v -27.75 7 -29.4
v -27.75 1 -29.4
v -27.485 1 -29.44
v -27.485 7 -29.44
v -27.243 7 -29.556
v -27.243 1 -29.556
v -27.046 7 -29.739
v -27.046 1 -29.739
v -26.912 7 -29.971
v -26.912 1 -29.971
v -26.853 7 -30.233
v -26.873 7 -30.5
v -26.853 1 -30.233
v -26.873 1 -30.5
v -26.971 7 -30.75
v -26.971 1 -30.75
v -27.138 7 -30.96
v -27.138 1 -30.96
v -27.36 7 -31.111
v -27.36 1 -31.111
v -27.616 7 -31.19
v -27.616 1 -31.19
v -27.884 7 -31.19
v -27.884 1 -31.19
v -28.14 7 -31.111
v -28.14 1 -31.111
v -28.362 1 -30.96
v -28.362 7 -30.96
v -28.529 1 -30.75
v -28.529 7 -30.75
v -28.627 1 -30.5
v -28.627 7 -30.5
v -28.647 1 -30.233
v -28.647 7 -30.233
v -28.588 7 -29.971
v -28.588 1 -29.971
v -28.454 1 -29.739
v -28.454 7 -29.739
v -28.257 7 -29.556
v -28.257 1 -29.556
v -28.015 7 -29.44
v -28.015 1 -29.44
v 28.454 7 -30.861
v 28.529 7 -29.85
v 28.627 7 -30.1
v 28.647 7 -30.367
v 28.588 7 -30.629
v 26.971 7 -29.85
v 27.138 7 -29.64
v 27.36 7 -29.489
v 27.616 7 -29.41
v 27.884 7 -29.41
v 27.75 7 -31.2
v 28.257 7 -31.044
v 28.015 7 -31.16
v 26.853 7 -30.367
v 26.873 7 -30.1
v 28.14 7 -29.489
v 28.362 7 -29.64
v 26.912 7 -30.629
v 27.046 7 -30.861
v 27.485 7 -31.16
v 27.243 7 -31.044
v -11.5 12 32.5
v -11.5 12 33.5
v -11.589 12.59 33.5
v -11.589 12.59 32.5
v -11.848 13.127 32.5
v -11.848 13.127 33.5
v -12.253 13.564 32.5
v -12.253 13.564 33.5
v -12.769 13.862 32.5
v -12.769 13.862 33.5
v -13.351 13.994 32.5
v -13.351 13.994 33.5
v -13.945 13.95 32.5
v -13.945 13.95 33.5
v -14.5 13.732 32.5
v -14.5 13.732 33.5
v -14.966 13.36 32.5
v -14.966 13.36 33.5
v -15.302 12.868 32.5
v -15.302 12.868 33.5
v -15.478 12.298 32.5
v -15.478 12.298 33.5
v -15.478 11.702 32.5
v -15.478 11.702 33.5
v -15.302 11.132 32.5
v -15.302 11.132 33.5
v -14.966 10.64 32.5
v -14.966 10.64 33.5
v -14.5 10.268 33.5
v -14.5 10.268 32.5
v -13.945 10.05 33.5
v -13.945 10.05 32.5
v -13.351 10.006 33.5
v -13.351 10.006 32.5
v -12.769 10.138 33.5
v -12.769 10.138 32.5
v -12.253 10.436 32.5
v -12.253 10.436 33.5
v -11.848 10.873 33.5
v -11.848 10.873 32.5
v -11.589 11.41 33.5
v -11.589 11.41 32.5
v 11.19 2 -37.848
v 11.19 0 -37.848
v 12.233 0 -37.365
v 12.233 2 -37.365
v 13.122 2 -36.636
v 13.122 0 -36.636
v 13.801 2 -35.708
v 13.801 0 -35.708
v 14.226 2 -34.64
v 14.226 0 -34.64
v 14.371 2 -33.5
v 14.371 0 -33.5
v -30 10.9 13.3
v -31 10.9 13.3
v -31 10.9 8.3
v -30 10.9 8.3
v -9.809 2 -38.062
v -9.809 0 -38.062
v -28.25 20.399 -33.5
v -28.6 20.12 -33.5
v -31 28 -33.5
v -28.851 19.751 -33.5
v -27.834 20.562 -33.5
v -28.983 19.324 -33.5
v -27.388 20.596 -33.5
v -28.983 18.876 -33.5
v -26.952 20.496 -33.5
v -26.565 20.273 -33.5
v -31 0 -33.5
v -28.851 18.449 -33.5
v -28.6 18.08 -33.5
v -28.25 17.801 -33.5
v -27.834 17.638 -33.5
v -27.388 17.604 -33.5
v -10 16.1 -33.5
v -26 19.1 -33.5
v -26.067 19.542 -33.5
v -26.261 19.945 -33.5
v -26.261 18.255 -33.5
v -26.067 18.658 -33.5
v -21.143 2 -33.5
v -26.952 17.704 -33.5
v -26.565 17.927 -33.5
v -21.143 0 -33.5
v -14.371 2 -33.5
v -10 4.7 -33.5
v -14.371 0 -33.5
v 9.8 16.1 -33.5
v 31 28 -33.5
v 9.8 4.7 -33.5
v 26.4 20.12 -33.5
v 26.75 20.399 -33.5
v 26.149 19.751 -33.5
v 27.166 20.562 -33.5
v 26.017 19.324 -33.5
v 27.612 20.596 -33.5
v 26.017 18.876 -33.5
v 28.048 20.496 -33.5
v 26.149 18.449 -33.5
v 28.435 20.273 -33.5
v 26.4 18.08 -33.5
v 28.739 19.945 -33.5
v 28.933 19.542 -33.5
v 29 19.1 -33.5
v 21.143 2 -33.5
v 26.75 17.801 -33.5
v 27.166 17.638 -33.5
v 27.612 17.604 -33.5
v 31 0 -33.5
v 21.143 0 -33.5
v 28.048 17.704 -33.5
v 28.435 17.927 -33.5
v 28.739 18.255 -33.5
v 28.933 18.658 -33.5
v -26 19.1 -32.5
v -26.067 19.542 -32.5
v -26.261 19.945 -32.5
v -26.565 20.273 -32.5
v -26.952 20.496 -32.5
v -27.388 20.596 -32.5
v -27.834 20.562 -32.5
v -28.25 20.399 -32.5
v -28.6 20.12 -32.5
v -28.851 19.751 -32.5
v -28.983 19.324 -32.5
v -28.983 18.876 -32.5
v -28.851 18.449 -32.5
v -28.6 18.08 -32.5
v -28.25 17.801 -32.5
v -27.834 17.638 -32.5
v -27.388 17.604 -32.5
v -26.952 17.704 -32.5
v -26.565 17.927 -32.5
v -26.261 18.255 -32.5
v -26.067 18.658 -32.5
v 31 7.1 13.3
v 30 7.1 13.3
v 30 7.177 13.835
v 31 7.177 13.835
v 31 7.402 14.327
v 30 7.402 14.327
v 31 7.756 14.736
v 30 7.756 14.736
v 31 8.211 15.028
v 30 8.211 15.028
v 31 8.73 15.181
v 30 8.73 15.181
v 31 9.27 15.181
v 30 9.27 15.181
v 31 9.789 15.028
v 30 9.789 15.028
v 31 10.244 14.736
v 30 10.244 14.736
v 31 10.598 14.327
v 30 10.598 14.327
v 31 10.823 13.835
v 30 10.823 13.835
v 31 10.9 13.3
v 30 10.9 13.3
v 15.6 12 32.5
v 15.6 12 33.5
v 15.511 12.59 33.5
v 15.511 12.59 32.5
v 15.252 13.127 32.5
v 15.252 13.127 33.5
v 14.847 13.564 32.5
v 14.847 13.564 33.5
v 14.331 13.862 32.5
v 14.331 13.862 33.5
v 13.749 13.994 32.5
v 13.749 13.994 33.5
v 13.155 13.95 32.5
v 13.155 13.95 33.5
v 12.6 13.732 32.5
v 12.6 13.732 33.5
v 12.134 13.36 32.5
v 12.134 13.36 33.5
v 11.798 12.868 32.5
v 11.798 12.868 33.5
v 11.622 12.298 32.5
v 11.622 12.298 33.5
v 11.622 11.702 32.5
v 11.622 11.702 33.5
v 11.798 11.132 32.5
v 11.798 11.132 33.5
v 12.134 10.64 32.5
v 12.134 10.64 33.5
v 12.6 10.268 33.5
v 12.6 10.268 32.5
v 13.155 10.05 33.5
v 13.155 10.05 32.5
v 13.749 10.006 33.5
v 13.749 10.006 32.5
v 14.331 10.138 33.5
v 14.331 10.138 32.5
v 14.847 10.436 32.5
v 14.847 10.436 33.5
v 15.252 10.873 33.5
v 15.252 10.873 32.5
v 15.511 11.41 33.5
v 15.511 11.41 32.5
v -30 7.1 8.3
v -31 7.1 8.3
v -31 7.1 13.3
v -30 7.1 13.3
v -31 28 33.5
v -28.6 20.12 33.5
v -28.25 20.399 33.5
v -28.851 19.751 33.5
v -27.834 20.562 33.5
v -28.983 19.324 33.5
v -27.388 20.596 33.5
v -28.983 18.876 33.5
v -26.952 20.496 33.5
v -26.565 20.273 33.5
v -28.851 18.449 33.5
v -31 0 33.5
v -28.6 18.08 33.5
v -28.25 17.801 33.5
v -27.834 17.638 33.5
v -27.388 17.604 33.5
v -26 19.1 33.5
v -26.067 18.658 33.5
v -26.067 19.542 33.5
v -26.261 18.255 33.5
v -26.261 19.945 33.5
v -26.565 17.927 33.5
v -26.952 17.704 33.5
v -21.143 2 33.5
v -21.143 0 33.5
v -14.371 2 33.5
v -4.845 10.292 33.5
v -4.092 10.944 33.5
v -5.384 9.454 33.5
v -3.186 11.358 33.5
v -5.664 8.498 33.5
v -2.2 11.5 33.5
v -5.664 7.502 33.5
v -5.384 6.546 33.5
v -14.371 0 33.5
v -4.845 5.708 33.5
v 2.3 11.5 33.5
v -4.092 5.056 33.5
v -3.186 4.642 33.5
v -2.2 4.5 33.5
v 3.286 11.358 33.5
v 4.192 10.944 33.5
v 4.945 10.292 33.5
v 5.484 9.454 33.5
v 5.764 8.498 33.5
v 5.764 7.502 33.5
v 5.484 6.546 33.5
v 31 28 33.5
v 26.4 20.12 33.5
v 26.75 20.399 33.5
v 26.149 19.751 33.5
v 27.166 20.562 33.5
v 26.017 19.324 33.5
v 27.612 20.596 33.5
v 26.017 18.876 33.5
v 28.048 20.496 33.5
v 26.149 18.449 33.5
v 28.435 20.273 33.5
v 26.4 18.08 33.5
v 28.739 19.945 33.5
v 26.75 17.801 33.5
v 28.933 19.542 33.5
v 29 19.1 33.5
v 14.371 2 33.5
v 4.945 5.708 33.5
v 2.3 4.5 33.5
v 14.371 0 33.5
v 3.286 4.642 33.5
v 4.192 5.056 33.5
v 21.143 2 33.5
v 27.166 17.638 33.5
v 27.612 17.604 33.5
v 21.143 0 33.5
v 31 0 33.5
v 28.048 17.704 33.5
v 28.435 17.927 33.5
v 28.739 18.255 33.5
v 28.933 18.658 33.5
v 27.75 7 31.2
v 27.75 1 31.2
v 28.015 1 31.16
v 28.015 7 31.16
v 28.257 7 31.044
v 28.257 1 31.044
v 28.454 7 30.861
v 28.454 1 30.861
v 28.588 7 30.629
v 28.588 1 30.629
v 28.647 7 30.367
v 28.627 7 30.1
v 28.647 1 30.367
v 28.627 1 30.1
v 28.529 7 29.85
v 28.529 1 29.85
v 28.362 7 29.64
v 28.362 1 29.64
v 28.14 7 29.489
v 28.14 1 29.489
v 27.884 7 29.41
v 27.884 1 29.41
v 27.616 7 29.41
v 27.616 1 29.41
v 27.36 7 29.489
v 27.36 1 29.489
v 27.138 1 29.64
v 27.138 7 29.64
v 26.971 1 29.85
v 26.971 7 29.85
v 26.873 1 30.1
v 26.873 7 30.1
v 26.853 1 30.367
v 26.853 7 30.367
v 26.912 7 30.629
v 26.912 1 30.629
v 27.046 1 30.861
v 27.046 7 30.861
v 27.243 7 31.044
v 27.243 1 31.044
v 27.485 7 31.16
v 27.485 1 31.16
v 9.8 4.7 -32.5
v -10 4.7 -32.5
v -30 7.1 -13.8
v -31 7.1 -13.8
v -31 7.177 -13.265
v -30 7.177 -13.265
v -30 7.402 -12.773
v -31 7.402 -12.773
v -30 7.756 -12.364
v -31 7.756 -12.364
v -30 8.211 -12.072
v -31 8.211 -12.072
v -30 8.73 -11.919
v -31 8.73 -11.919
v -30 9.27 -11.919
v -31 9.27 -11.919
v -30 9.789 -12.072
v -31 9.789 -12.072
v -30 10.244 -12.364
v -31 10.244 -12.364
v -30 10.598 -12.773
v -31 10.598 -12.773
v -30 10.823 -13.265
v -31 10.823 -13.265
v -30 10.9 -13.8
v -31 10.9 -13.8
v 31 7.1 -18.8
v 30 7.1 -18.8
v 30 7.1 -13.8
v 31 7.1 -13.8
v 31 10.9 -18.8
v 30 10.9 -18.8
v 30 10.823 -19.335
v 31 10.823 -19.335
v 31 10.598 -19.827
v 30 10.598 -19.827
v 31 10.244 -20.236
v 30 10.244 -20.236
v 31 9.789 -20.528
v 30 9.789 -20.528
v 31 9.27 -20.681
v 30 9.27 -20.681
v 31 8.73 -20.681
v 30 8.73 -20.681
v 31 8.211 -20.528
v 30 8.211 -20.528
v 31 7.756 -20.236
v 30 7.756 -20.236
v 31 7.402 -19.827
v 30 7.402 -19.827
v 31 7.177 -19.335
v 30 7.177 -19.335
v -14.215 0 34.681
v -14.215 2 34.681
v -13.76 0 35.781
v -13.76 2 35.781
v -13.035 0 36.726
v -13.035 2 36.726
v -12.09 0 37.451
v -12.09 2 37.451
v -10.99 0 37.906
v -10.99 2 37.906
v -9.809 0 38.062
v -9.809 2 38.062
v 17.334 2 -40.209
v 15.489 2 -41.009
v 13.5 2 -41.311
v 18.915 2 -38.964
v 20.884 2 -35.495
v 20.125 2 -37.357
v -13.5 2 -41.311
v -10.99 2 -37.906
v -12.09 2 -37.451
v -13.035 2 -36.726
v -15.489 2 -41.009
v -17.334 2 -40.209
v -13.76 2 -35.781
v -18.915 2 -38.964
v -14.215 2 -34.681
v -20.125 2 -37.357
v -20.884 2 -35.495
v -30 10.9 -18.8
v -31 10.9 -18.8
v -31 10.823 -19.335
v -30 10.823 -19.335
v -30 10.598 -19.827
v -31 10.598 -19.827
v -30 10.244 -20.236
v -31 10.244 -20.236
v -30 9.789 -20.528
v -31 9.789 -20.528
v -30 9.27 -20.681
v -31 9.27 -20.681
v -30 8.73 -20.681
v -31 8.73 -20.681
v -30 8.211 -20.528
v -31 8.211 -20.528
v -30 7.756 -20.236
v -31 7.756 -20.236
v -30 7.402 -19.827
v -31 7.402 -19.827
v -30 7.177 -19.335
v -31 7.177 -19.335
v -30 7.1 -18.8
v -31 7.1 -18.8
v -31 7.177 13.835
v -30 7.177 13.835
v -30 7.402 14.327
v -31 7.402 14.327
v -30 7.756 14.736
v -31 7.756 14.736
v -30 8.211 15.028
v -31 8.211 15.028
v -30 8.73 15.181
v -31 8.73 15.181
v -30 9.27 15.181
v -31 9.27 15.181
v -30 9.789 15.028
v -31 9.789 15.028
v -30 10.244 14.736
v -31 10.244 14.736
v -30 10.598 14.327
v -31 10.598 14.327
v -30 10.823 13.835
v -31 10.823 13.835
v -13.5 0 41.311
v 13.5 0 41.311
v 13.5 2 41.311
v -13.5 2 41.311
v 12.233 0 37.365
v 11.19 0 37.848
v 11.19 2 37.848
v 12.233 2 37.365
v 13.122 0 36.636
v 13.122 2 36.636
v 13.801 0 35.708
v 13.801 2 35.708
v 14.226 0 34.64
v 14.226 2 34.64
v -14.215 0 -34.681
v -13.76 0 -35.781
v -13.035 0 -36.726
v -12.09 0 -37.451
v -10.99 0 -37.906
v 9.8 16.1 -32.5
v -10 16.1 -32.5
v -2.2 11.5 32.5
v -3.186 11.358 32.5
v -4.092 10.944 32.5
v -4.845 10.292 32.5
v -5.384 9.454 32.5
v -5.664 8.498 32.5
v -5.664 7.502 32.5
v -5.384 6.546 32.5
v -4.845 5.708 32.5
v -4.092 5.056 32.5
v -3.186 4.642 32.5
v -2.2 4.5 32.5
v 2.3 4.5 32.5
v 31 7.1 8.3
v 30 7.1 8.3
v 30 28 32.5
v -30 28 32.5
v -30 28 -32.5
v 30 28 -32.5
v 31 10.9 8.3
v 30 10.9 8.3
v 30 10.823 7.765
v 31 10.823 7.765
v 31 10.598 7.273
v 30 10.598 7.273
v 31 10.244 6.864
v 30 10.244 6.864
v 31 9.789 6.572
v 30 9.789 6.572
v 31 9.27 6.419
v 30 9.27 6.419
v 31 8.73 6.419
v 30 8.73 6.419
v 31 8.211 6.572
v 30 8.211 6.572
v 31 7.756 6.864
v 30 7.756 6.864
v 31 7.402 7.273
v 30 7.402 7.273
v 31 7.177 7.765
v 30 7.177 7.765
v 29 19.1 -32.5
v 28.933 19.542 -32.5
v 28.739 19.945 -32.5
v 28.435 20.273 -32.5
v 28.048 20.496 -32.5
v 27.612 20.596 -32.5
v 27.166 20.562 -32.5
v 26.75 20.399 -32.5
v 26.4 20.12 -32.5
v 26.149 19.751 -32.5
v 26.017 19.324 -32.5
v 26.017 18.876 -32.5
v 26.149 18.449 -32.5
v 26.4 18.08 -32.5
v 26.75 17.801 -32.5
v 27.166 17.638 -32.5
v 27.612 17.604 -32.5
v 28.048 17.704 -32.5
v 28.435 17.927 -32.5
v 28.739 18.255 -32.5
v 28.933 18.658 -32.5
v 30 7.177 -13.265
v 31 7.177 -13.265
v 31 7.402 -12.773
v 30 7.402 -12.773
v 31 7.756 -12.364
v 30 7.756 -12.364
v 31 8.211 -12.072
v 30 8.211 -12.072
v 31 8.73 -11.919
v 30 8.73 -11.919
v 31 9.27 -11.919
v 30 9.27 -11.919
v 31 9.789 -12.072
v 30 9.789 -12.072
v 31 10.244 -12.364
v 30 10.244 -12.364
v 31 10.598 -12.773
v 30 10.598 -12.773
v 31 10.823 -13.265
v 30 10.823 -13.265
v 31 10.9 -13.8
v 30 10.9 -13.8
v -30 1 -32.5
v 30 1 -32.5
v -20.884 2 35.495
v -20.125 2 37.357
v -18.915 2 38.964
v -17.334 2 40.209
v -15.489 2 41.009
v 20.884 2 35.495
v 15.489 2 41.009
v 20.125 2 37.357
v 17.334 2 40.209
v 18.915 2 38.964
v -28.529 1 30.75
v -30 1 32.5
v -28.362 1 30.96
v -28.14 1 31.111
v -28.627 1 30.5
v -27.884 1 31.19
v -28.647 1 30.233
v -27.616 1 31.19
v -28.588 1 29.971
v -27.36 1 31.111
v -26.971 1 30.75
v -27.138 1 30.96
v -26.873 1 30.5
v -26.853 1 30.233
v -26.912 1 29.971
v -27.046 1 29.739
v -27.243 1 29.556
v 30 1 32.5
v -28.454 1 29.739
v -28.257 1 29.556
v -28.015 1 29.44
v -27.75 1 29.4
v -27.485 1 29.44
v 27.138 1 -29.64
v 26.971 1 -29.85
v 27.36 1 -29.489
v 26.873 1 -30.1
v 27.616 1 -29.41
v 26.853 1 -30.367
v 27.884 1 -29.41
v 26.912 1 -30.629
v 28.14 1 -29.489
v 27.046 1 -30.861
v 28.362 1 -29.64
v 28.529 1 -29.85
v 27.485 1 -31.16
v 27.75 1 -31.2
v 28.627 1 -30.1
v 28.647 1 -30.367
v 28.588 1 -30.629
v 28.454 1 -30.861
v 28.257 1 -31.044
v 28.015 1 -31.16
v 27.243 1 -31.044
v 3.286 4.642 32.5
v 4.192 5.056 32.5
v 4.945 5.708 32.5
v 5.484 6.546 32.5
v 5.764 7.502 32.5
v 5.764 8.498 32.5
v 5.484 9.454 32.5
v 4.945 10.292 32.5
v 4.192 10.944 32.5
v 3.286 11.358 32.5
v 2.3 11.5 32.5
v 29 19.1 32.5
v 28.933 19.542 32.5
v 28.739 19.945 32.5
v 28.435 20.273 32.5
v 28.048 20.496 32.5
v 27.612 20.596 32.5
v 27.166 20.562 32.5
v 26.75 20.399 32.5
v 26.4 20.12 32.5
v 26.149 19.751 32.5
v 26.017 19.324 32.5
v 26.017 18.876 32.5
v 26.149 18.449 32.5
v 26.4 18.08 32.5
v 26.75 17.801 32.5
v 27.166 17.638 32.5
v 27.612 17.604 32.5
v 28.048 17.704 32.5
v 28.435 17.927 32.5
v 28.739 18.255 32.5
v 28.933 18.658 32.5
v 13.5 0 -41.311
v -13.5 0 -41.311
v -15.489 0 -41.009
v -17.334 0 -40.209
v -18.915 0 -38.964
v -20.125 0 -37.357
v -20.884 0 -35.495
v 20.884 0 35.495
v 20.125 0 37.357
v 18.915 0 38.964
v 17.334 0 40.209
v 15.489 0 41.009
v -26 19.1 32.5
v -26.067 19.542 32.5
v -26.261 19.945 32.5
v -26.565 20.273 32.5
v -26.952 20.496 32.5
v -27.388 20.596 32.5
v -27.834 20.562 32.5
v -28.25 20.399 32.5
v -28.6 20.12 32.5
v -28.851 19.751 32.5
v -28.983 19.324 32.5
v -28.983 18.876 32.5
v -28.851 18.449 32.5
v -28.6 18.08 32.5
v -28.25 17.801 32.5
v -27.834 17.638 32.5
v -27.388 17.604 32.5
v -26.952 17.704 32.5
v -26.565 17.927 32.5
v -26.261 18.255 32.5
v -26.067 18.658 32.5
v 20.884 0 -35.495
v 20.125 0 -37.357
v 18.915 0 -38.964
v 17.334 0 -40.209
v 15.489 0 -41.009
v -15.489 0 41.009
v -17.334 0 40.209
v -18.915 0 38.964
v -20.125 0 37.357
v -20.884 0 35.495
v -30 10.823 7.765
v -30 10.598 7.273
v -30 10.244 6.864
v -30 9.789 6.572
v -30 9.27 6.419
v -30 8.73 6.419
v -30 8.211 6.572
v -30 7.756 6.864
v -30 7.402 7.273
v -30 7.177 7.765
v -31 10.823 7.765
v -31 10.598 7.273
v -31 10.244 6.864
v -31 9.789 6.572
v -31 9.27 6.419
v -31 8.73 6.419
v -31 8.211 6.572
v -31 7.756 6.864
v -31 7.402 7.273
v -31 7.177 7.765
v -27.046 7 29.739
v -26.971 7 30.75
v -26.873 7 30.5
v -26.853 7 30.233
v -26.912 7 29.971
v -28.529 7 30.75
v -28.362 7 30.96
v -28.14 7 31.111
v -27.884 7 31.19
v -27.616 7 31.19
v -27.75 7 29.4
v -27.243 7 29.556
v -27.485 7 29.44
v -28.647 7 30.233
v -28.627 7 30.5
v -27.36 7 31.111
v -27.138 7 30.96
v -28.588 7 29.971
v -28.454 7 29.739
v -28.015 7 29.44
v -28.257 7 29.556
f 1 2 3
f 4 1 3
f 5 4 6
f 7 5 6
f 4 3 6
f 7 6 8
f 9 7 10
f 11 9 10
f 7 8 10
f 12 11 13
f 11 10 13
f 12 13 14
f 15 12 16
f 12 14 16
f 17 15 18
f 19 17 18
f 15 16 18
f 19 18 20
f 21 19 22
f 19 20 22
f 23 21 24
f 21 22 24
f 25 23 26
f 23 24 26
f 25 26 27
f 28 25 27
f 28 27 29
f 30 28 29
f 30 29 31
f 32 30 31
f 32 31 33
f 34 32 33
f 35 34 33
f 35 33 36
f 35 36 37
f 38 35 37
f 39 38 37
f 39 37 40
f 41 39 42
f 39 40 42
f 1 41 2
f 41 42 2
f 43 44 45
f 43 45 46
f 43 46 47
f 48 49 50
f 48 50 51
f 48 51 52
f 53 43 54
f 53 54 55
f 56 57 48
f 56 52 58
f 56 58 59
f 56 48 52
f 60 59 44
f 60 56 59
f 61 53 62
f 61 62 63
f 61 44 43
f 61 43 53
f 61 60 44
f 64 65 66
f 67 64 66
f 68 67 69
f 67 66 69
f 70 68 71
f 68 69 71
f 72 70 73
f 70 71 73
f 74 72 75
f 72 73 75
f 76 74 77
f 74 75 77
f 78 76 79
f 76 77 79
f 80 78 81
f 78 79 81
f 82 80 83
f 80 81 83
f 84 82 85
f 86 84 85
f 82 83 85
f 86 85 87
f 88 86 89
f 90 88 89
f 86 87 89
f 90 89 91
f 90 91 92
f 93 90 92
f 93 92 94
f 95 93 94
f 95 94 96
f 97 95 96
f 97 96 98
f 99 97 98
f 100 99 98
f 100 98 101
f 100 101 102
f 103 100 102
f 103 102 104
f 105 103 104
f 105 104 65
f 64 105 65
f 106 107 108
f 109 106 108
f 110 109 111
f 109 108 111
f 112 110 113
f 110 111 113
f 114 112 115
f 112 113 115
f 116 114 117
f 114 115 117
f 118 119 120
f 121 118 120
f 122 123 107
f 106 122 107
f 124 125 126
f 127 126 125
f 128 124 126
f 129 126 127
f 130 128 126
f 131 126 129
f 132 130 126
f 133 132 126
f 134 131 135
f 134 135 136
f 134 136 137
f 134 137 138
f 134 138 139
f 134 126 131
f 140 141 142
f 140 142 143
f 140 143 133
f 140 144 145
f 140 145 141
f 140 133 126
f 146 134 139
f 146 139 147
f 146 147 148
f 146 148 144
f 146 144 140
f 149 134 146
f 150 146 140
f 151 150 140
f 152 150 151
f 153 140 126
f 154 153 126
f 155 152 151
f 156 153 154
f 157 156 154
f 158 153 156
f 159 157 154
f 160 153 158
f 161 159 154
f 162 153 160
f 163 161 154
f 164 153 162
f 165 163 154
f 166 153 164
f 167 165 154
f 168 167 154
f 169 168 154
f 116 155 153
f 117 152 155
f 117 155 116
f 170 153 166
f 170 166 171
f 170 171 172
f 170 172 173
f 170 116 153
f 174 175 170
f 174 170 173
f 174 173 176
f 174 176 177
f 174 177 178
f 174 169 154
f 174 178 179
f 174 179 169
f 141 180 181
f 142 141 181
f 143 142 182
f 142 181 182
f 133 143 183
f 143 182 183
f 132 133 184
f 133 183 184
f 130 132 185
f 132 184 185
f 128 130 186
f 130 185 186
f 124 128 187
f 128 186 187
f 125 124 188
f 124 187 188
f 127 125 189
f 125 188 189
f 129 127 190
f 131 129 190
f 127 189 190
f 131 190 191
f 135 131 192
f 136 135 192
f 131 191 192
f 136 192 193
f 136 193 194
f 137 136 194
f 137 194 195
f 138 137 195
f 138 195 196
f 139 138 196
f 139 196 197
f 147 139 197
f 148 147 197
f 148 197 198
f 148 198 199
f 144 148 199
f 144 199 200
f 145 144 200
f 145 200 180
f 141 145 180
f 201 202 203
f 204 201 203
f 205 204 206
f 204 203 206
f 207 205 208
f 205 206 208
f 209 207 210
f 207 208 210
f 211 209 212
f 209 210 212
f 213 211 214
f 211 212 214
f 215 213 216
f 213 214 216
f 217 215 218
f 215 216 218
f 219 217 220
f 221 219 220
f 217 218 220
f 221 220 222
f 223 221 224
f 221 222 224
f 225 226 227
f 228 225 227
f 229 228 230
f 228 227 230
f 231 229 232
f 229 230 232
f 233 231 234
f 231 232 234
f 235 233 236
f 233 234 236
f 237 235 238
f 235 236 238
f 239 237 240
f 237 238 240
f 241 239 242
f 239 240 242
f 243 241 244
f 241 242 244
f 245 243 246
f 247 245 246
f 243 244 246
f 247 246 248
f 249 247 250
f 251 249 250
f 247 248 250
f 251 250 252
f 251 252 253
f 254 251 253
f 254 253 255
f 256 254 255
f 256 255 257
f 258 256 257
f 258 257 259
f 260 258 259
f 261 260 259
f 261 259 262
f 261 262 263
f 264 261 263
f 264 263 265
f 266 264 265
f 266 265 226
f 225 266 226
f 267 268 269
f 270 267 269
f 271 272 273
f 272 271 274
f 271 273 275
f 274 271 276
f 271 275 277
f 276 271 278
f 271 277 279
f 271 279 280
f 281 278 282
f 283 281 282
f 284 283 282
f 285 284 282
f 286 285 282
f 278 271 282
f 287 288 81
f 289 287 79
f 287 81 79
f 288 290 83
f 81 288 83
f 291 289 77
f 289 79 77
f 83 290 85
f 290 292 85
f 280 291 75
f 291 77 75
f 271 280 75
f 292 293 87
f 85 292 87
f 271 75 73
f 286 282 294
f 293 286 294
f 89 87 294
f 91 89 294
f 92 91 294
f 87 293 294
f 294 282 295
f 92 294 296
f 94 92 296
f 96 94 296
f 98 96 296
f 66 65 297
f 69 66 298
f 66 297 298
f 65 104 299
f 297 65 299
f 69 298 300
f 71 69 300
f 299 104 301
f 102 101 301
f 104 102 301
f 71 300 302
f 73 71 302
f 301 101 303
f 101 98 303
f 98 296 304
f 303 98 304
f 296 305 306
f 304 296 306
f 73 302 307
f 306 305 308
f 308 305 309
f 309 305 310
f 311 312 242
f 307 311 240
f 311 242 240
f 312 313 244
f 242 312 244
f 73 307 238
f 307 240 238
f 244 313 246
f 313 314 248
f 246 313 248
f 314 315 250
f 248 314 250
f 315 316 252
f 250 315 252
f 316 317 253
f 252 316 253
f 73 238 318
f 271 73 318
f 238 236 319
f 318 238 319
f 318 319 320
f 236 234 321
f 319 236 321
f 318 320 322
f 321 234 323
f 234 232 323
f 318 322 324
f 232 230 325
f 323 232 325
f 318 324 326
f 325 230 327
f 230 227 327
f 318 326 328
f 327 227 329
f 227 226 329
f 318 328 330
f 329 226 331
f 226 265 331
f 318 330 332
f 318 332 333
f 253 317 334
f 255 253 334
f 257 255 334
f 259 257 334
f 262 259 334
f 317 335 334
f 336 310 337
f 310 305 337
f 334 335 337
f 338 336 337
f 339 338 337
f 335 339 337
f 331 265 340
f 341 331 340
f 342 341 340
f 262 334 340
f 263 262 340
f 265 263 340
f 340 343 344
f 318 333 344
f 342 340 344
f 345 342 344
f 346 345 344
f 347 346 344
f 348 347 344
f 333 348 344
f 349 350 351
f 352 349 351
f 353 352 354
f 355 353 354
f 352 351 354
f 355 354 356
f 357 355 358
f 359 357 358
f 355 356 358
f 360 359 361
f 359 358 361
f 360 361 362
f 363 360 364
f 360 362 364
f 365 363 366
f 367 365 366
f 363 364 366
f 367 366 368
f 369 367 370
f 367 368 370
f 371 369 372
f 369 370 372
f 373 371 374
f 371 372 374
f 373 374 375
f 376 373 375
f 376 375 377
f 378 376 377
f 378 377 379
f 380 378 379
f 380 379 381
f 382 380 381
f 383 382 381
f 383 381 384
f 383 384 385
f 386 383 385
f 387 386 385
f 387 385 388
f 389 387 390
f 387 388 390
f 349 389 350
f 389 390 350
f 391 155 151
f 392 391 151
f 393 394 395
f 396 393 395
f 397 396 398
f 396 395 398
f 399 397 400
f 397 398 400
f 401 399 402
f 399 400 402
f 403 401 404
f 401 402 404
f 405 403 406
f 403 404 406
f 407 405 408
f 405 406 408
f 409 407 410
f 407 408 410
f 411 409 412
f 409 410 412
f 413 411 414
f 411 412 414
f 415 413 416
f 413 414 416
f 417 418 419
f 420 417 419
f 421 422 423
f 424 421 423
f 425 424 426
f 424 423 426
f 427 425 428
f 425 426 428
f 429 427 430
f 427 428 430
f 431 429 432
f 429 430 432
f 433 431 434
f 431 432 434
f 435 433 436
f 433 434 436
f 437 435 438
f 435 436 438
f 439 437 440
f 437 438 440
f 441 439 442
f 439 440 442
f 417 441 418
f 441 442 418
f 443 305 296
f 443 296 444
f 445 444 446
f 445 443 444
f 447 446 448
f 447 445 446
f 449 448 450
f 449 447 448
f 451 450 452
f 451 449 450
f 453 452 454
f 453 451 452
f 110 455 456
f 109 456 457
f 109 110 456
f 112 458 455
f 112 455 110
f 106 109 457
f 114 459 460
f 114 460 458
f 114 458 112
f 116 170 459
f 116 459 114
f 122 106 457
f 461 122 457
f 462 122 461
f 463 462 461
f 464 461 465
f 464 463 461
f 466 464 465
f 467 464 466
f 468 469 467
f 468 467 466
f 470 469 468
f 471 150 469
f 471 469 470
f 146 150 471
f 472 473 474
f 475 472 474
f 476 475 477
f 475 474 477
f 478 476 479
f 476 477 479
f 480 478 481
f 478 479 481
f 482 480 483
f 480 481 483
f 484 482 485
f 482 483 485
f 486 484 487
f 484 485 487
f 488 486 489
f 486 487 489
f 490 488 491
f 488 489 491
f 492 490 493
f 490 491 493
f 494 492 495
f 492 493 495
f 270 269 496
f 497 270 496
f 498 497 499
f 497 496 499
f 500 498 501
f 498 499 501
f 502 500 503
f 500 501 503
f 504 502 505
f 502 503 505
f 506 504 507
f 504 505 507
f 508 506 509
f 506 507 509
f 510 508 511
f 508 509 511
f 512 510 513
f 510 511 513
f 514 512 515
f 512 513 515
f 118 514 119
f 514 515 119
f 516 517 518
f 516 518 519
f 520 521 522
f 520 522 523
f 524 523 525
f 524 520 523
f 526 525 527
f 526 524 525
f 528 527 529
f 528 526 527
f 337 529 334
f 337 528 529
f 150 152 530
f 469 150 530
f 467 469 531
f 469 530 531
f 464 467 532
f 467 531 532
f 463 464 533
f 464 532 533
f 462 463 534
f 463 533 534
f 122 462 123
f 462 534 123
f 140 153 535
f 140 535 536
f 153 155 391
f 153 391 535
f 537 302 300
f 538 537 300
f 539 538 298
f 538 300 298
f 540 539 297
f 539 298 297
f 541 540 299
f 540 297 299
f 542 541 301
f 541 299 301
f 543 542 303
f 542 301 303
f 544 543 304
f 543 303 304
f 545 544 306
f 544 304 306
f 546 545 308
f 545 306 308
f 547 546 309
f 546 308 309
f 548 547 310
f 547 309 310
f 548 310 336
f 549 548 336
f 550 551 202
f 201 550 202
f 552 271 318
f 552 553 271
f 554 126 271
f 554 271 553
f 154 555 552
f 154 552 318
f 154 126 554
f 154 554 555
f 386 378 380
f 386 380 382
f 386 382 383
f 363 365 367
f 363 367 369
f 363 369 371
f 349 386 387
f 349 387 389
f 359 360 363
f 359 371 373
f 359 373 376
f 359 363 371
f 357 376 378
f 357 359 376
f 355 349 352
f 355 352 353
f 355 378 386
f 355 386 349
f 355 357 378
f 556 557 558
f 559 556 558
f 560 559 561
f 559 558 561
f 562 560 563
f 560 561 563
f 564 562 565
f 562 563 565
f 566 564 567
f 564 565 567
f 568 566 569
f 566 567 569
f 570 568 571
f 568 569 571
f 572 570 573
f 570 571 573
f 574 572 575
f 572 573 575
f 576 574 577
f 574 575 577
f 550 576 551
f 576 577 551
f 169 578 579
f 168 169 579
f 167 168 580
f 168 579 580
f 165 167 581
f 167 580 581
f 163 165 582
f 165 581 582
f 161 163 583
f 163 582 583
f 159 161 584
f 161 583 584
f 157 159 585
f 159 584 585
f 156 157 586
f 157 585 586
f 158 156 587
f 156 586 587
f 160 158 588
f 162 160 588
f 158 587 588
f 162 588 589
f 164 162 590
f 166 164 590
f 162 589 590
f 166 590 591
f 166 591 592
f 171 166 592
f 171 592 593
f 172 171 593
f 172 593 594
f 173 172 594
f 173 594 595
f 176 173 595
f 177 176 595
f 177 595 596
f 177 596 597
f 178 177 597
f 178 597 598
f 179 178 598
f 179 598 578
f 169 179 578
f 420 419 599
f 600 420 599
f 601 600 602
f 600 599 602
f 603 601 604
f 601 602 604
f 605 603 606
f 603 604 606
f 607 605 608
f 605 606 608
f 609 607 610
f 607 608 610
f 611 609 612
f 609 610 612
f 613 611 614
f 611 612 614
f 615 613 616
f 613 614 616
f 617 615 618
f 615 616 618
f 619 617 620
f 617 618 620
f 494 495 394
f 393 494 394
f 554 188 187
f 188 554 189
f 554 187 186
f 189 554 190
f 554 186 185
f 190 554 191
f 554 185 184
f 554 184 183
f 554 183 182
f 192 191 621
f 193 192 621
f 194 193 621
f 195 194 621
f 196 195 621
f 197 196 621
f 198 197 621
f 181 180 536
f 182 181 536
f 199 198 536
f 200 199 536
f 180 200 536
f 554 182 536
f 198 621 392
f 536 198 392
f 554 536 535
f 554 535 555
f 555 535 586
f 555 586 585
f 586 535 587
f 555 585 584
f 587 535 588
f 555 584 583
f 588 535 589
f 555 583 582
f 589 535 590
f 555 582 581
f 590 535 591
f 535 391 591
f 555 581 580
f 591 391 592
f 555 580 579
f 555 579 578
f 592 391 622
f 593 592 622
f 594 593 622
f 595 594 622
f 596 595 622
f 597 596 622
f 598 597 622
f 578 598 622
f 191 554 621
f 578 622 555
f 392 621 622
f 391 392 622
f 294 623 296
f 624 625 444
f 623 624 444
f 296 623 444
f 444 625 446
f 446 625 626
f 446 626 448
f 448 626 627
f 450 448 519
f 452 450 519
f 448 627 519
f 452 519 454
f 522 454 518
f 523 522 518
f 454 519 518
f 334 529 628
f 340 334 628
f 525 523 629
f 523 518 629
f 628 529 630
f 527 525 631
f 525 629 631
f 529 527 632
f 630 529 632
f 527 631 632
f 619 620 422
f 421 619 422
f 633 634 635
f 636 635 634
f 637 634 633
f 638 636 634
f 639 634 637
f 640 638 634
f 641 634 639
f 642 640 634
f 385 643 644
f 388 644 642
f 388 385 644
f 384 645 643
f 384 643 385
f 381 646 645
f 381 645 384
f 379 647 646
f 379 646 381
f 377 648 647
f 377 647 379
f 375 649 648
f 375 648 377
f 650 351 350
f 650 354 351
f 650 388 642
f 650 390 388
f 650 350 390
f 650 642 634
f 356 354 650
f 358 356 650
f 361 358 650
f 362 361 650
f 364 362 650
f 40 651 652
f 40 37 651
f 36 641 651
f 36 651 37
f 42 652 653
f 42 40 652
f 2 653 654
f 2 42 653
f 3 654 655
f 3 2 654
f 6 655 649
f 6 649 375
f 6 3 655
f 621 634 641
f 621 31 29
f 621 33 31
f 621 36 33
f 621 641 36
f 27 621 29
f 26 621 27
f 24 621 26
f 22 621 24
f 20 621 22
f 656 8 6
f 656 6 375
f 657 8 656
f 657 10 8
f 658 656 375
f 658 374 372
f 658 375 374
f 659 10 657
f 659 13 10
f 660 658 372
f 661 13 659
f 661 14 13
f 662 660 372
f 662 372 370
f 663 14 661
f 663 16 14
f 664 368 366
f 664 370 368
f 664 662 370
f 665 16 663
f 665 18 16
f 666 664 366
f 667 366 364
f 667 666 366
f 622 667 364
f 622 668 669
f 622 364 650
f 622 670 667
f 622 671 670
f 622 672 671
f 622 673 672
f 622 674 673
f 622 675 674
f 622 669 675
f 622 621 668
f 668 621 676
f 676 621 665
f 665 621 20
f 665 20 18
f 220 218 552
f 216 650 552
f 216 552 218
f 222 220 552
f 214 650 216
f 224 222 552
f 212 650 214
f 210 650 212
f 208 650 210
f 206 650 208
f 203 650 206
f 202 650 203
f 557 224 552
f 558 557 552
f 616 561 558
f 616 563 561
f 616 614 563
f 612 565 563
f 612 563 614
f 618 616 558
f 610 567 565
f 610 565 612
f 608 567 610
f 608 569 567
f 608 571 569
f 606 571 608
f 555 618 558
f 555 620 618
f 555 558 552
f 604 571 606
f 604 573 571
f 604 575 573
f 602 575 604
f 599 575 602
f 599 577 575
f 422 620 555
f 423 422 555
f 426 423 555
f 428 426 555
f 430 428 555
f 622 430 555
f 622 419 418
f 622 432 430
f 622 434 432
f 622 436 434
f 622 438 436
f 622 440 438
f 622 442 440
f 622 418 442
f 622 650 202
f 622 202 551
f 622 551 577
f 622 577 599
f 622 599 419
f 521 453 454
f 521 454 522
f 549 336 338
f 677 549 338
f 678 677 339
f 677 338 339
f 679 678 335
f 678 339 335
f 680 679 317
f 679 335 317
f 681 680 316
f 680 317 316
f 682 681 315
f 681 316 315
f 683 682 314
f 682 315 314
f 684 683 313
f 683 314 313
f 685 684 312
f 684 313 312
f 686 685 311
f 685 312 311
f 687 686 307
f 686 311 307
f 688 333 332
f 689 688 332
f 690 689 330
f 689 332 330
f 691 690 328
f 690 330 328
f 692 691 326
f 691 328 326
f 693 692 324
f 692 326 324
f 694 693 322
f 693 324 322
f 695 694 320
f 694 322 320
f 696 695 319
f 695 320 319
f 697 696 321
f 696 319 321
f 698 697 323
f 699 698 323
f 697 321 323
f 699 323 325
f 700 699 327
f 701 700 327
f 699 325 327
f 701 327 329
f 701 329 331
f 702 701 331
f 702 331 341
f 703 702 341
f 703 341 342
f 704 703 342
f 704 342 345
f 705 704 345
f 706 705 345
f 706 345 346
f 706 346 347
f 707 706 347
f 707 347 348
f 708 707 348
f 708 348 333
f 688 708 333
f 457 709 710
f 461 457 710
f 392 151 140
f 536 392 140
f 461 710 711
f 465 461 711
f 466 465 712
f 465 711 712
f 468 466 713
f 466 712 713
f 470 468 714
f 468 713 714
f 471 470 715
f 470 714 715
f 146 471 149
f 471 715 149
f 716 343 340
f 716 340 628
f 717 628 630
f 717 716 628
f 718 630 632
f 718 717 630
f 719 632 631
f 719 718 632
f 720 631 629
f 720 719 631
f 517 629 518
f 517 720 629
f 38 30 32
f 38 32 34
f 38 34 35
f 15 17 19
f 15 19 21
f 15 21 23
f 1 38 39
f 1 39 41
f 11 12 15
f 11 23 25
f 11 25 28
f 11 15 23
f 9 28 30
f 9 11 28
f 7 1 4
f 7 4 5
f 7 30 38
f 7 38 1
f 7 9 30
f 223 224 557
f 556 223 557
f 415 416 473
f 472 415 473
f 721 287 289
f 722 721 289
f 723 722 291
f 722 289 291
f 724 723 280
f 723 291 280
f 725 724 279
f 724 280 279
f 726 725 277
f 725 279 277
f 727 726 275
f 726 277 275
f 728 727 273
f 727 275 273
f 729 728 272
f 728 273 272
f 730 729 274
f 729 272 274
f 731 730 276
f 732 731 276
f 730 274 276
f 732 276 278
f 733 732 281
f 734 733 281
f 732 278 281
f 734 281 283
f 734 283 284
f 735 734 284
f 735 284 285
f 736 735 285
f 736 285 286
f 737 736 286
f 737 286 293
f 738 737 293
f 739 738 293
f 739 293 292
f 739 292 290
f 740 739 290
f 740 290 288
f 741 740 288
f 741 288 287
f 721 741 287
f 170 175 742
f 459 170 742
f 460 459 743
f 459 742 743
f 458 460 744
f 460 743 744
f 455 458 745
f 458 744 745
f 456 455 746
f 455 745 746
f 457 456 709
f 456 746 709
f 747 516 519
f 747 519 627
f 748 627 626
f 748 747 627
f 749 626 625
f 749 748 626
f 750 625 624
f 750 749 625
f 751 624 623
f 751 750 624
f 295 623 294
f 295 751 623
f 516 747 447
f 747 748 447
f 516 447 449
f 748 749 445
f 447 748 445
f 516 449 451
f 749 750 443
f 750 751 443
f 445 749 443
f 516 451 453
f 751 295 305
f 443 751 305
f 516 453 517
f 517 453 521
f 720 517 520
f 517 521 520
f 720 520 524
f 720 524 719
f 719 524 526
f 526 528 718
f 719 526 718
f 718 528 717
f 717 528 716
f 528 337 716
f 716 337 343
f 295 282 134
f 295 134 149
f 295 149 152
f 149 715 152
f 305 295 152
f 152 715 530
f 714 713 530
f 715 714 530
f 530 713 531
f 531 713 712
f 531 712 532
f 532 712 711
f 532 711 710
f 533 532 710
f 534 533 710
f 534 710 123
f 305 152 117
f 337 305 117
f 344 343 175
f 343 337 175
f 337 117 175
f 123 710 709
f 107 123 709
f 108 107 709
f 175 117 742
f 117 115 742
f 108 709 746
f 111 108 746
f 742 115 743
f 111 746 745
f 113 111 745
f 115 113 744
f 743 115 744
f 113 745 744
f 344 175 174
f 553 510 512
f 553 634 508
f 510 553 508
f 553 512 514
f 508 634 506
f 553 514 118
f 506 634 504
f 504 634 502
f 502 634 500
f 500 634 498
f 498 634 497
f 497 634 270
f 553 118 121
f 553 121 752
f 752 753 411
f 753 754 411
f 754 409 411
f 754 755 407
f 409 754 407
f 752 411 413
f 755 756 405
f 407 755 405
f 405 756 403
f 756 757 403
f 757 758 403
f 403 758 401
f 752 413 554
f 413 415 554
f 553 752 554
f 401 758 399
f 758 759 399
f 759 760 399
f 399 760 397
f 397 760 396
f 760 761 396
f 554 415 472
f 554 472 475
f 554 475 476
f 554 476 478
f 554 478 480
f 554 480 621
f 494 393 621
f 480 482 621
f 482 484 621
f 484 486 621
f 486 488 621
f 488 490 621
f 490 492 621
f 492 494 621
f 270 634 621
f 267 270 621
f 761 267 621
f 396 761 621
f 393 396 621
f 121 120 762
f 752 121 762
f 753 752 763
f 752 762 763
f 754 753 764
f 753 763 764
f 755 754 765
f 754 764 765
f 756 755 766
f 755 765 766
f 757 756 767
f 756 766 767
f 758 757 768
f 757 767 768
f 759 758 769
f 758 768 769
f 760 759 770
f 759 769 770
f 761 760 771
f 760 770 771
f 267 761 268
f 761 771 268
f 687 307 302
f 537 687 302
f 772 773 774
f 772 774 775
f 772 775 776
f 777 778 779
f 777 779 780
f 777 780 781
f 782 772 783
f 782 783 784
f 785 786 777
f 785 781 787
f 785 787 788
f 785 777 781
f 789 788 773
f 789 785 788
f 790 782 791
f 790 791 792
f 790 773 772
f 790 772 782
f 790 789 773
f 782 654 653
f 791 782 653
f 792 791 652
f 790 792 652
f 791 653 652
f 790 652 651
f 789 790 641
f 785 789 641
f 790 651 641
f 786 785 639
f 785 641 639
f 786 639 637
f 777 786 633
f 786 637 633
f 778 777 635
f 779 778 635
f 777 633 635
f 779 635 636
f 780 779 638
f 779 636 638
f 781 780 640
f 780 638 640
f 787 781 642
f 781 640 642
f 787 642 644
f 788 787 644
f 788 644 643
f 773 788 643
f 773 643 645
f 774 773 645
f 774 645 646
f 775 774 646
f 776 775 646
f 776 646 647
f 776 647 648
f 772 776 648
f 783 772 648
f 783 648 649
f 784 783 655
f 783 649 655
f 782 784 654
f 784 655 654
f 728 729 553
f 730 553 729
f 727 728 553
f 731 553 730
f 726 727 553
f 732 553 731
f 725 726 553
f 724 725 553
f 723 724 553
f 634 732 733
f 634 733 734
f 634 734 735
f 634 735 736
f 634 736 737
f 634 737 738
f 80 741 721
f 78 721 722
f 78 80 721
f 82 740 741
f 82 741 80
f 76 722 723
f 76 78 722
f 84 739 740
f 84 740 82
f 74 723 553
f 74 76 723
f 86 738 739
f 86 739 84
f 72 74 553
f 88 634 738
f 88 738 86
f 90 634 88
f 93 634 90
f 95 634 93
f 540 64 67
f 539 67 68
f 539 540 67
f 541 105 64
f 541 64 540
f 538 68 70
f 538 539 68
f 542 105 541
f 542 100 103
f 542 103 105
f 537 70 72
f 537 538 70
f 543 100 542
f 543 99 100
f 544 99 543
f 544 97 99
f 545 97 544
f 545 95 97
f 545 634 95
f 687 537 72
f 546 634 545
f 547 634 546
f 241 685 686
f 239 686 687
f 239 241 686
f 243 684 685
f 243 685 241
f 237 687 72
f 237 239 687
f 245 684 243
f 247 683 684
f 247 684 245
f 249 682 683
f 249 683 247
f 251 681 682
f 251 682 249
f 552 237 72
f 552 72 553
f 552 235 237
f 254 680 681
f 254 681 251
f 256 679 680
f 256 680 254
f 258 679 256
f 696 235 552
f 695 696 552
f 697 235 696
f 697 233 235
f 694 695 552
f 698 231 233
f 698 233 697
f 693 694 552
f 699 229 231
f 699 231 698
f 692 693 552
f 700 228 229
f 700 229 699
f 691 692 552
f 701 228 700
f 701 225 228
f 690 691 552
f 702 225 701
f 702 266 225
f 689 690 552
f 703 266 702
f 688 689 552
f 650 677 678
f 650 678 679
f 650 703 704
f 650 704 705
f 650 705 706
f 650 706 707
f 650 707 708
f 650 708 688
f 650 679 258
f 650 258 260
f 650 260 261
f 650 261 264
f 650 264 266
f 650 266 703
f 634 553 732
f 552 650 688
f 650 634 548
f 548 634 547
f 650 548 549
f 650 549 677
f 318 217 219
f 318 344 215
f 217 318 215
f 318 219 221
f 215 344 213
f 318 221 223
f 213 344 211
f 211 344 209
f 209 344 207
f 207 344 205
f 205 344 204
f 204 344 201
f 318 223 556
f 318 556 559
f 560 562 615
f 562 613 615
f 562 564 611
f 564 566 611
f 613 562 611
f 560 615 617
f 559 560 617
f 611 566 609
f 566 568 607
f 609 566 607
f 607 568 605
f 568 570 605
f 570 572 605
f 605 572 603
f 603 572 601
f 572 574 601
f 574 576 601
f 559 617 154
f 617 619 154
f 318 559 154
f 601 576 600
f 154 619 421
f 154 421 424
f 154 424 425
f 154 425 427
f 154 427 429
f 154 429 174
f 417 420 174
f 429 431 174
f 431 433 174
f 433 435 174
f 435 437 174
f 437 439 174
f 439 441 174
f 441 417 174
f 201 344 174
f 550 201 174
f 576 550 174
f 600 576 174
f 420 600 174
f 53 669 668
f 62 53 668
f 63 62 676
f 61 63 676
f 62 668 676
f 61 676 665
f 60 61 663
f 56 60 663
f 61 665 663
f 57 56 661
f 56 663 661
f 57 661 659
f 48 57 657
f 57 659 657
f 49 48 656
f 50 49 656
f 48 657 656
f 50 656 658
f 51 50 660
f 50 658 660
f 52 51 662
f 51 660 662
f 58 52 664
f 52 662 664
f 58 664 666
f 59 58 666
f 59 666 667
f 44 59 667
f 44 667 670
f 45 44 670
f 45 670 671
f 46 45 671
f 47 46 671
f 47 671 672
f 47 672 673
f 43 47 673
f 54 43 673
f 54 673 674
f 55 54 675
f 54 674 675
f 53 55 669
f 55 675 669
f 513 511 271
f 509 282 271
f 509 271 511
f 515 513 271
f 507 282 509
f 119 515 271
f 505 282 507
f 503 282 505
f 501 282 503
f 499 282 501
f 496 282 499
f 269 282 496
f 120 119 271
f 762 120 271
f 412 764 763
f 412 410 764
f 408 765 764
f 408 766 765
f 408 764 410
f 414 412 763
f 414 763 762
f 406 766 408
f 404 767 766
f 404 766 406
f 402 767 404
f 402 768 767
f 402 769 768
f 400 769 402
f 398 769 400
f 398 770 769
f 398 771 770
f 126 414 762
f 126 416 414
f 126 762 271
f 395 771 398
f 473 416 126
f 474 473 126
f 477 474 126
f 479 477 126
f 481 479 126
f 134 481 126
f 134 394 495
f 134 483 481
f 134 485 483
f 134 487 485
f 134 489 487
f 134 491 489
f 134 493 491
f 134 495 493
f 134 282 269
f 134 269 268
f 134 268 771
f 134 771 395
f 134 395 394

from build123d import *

# Parameters (mm, degrees)
SKETCH_1_W               = 62
SKETCH_1_H               = 67
EXTRUDE_1_DEPTH          = 1
SKETCH_3_R               = 0.9
EXTRUDE_2_DEPTH          = 6
SKETCH_5_W               = 62
SKETCH_5_H               = 67
SKETCH_5_W_2             = 60
SKETCH_5_H_2             = 65
EXTRUDE_3_DEPTH          = 27
SKETCH_6_W               = 19.8
SKETCH_6_H               = 11.4
CUT_EXTRUDE_1_DEPTH      = 2
CUT_EXTRUDE_2_DEPTH      = 76.830402874
CUT_EXTRUDE_2_DEPTH_BACK = 76.830402874
CUT_EXTRUDE_3_DEPTH      = 2
SKETCH_8_3_R             = 2
CUT_EXTRUDE_4_DEPTH      = 10
SKETCH_9_R               = 1.5
CUT_EXTRUDE_5_DEPTH      = 79.955683773
EXTRUDE_4_DEPTH          = 2


with BuildPart() as part:
    # Эскиз1 → Бобышка-Вытянуть1 (new body)
    with BuildSketch(Plane(origin=(0, 0, 0), x_dir=(1, 0, 0), z_dir=(0, 1, 0))):
        Rectangle(SKETCH_1_W, SKETCH_1_H)
    extrude(amount=EXTRUDE_1_DEPTH)

    # Эскиз3 → Бобышка-Вытянуть2 (add)
    with BuildSketch(Plane(origin=(0, 1, 0), x_dir=(1, 0, 0), z_dir=(0, 1, 0))):
        with Locations((27.75, -30.3)):
            Circle(SKETCH_3_R)
        with Locations((27.75, 30.3)):
            Circle(SKETCH_3_R)
        with Locations((-27.75, -30.3)):
            Circle(SKETCH_3_R)
        with Locations((-27.75, 30.3)):
            Circle(SKETCH_3_R)
    extrude(amount=EXTRUDE_2_DEPTH)

    # Эскиз5 → Бобышка-Вытянуть3 (add)
    with BuildSketch(Plane(origin=(0, 1, 0), x_dir=(1, 0, 0), z_dir=(0, 1, 0))):
        Rectangle(SKETCH_5_W, SKETCH_5_H)
        Rectangle(SKETCH_5_W_2, SKETCH_5_H_2, mode=Mode.SUBTRACT)
    extrude(amount=EXTRUDE_3_DEPTH)

    # Эскиз6 → Вырез-Вытянуть1 (cut)
    with BuildSketch(Plane(origin=(0, 0, -33.5), x_dir=(-1, 0, 0), z_dir=(0, 0, -1))):
        with Locations((0.1, 10.4)):
            Rectangle(SKETCH_6_W, SKETCH_6_H)
    extrude(amount=-CUT_EXTRUDE_1_DEPTH, mode=Mode.SUBTRACT)

    # Эскиз7 → Вырез-Вытянуть2 (cut, two sides: drawn at the far end of the back side and taken through both)
    with BuildSketch(Plane(origin=(31, 0, 0), x_dir=(0, 0, -1), z_dir=(1, 0, 0)).offset(-CUT_EXTRUDE_2_DEPTH_BACK)):
        with BuildLine():
            Line((-13.3, 10.9), (-8.3, 10.9))
            ThreePointArc((-8.3, 10.9), (-6.4, 9), (-8.3, 7.1))
            Line((-8.3, 7.1), (-13.3, 7.1))
            ThreePointArc((-13.3, 7.1), (-15.2, 9), (-13.3, 10.9))
        make_face()
        with BuildLine():
            Line((13.8, 10.9), (18.8, 10.9))
            ThreePointArc((18.8, 10.9), (20.7, 9), (18.8, 7.1))
            Line((18.8, 7.1), (13.8, 7.1))
            ThreePointArc((13.8, 7.1), (11.9, 9), (13.8, 10.9))
        make_face()
    extrude(amount=CUT_EXTRUDE_2_DEPTH + CUT_EXTRUDE_2_DEPTH_BACK, mode=Mode.SUBTRACT)

    # Эскиз8 → Вырез-Вытянуть3 (cut)
    with BuildSketch(Plane.XY.offset(33.5)):
        with BuildLine():
            Line((-2.2, 4.5), (2.3, 4.5))
            ThreePointArc((2.3, 4.5), (5.8, 8), (2.3, 11.5))
            Line((2.3, 11.5), (-2.2, 11.5))
            ThreePointArc((-2.2, 11.5), (-5.7, 8), (-2.2, 4.5))
        make_face()
    extrude(amount=-CUT_EXTRUDE_3_DEPTH, mode=Mode.SUBTRACT)

    # Эскиз8<3> → Вырез-Вытянуть4 (cut)
    with BuildSketch(Plane.XY.offset(33.5)):
        with Locations((-13.5, 12)):
            Circle(SKETCH_8_3_R)
        with Locations((13.6, 12)):
            Circle(SKETCH_8_3_R)
    extrude(amount=-CUT_EXTRUDE_4_DEPTH, mode=Mode.SUBTRACT)

    # Эскиз9 → Вырез-Вытянуть5 (cut, through all)
    with BuildSketch(Plane.XY.offset(33.5)):
        with Locations((-27.5, 19.1)):
            Circle(SKETCH_9_R)
        with Locations((27.5, 19.1)):
            Circle(SKETCH_9_R)
    extrude(amount=-CUT_EXTRUDE_5_DEPTH, mode=Mode.SUBTRACT)

    # Эскиз10 → Бобышка-Вытянуть4 (add)
    with BuildSketch(Plane.XZ):
        with BuildLine():
            Line((14.370902848, -33.5), (21.143202049, -33.5))
            ThreePointArc((21.143202049, -33.5), (18.914555679, -38.964375793), (13.5, -41.311470647))
            Line((13.5, -41.311470647), (-13.5, -41.311470647))
            ThreePointArc((-13.5, -41.311470647), (-18.914555679, -38.964375793), (-21.143202049, -33.5))
            Line((-21.143202049, -33.5), (-14.370902848, -33.5))
            ThreePointArc((-14.370902848, -33.5), (-13.034801548, -36.725633878), (-9.80916767, -38.061735178))
            Line((-9.80916767, -38.061735178), (11.18974267, -37.847808701))
            ThreePointArc((11.18974267, -37.847808701), (13.490692176, -36.193660176), (14.370902848, -33.5))
        make_face()
        with BuildLine():
            Line((-21.143202049, 33.5), (-14.39209337, 33.5))
            Line((-14.39209337, 33.5), (-14.370902848, 33.5))
            ThreePointArc((-14.370902848, 33.5), (-13.034801548, 36.725633878), (-9.80916767, 38.061735178))
            Line((-9.80916767, 38.061735178), (11.18974267, 37.847808701))
            ThreePointArc((11.18974267, 37.847808701), (13.490692176, 36.193660176), (14.370902848, 33.5))
            Line((14.370902848, 33.5), (21.143202049, 33.5))
            ThreePointArc((21.143202049, 33.5), (18.914555679, 38.964375793), (13.5, 41.311470647))
            Line((13.5, 41.311470647), (-13.5, 41.311470647))
            ThreePointArc((-13.5, 41.311470647), (-18.914555679, 38.964375793), (-21.143202049, 33.5))
        make_face()
    extrude(amount=-EXTRUDE_4_DEPTH)


solid = part.part
